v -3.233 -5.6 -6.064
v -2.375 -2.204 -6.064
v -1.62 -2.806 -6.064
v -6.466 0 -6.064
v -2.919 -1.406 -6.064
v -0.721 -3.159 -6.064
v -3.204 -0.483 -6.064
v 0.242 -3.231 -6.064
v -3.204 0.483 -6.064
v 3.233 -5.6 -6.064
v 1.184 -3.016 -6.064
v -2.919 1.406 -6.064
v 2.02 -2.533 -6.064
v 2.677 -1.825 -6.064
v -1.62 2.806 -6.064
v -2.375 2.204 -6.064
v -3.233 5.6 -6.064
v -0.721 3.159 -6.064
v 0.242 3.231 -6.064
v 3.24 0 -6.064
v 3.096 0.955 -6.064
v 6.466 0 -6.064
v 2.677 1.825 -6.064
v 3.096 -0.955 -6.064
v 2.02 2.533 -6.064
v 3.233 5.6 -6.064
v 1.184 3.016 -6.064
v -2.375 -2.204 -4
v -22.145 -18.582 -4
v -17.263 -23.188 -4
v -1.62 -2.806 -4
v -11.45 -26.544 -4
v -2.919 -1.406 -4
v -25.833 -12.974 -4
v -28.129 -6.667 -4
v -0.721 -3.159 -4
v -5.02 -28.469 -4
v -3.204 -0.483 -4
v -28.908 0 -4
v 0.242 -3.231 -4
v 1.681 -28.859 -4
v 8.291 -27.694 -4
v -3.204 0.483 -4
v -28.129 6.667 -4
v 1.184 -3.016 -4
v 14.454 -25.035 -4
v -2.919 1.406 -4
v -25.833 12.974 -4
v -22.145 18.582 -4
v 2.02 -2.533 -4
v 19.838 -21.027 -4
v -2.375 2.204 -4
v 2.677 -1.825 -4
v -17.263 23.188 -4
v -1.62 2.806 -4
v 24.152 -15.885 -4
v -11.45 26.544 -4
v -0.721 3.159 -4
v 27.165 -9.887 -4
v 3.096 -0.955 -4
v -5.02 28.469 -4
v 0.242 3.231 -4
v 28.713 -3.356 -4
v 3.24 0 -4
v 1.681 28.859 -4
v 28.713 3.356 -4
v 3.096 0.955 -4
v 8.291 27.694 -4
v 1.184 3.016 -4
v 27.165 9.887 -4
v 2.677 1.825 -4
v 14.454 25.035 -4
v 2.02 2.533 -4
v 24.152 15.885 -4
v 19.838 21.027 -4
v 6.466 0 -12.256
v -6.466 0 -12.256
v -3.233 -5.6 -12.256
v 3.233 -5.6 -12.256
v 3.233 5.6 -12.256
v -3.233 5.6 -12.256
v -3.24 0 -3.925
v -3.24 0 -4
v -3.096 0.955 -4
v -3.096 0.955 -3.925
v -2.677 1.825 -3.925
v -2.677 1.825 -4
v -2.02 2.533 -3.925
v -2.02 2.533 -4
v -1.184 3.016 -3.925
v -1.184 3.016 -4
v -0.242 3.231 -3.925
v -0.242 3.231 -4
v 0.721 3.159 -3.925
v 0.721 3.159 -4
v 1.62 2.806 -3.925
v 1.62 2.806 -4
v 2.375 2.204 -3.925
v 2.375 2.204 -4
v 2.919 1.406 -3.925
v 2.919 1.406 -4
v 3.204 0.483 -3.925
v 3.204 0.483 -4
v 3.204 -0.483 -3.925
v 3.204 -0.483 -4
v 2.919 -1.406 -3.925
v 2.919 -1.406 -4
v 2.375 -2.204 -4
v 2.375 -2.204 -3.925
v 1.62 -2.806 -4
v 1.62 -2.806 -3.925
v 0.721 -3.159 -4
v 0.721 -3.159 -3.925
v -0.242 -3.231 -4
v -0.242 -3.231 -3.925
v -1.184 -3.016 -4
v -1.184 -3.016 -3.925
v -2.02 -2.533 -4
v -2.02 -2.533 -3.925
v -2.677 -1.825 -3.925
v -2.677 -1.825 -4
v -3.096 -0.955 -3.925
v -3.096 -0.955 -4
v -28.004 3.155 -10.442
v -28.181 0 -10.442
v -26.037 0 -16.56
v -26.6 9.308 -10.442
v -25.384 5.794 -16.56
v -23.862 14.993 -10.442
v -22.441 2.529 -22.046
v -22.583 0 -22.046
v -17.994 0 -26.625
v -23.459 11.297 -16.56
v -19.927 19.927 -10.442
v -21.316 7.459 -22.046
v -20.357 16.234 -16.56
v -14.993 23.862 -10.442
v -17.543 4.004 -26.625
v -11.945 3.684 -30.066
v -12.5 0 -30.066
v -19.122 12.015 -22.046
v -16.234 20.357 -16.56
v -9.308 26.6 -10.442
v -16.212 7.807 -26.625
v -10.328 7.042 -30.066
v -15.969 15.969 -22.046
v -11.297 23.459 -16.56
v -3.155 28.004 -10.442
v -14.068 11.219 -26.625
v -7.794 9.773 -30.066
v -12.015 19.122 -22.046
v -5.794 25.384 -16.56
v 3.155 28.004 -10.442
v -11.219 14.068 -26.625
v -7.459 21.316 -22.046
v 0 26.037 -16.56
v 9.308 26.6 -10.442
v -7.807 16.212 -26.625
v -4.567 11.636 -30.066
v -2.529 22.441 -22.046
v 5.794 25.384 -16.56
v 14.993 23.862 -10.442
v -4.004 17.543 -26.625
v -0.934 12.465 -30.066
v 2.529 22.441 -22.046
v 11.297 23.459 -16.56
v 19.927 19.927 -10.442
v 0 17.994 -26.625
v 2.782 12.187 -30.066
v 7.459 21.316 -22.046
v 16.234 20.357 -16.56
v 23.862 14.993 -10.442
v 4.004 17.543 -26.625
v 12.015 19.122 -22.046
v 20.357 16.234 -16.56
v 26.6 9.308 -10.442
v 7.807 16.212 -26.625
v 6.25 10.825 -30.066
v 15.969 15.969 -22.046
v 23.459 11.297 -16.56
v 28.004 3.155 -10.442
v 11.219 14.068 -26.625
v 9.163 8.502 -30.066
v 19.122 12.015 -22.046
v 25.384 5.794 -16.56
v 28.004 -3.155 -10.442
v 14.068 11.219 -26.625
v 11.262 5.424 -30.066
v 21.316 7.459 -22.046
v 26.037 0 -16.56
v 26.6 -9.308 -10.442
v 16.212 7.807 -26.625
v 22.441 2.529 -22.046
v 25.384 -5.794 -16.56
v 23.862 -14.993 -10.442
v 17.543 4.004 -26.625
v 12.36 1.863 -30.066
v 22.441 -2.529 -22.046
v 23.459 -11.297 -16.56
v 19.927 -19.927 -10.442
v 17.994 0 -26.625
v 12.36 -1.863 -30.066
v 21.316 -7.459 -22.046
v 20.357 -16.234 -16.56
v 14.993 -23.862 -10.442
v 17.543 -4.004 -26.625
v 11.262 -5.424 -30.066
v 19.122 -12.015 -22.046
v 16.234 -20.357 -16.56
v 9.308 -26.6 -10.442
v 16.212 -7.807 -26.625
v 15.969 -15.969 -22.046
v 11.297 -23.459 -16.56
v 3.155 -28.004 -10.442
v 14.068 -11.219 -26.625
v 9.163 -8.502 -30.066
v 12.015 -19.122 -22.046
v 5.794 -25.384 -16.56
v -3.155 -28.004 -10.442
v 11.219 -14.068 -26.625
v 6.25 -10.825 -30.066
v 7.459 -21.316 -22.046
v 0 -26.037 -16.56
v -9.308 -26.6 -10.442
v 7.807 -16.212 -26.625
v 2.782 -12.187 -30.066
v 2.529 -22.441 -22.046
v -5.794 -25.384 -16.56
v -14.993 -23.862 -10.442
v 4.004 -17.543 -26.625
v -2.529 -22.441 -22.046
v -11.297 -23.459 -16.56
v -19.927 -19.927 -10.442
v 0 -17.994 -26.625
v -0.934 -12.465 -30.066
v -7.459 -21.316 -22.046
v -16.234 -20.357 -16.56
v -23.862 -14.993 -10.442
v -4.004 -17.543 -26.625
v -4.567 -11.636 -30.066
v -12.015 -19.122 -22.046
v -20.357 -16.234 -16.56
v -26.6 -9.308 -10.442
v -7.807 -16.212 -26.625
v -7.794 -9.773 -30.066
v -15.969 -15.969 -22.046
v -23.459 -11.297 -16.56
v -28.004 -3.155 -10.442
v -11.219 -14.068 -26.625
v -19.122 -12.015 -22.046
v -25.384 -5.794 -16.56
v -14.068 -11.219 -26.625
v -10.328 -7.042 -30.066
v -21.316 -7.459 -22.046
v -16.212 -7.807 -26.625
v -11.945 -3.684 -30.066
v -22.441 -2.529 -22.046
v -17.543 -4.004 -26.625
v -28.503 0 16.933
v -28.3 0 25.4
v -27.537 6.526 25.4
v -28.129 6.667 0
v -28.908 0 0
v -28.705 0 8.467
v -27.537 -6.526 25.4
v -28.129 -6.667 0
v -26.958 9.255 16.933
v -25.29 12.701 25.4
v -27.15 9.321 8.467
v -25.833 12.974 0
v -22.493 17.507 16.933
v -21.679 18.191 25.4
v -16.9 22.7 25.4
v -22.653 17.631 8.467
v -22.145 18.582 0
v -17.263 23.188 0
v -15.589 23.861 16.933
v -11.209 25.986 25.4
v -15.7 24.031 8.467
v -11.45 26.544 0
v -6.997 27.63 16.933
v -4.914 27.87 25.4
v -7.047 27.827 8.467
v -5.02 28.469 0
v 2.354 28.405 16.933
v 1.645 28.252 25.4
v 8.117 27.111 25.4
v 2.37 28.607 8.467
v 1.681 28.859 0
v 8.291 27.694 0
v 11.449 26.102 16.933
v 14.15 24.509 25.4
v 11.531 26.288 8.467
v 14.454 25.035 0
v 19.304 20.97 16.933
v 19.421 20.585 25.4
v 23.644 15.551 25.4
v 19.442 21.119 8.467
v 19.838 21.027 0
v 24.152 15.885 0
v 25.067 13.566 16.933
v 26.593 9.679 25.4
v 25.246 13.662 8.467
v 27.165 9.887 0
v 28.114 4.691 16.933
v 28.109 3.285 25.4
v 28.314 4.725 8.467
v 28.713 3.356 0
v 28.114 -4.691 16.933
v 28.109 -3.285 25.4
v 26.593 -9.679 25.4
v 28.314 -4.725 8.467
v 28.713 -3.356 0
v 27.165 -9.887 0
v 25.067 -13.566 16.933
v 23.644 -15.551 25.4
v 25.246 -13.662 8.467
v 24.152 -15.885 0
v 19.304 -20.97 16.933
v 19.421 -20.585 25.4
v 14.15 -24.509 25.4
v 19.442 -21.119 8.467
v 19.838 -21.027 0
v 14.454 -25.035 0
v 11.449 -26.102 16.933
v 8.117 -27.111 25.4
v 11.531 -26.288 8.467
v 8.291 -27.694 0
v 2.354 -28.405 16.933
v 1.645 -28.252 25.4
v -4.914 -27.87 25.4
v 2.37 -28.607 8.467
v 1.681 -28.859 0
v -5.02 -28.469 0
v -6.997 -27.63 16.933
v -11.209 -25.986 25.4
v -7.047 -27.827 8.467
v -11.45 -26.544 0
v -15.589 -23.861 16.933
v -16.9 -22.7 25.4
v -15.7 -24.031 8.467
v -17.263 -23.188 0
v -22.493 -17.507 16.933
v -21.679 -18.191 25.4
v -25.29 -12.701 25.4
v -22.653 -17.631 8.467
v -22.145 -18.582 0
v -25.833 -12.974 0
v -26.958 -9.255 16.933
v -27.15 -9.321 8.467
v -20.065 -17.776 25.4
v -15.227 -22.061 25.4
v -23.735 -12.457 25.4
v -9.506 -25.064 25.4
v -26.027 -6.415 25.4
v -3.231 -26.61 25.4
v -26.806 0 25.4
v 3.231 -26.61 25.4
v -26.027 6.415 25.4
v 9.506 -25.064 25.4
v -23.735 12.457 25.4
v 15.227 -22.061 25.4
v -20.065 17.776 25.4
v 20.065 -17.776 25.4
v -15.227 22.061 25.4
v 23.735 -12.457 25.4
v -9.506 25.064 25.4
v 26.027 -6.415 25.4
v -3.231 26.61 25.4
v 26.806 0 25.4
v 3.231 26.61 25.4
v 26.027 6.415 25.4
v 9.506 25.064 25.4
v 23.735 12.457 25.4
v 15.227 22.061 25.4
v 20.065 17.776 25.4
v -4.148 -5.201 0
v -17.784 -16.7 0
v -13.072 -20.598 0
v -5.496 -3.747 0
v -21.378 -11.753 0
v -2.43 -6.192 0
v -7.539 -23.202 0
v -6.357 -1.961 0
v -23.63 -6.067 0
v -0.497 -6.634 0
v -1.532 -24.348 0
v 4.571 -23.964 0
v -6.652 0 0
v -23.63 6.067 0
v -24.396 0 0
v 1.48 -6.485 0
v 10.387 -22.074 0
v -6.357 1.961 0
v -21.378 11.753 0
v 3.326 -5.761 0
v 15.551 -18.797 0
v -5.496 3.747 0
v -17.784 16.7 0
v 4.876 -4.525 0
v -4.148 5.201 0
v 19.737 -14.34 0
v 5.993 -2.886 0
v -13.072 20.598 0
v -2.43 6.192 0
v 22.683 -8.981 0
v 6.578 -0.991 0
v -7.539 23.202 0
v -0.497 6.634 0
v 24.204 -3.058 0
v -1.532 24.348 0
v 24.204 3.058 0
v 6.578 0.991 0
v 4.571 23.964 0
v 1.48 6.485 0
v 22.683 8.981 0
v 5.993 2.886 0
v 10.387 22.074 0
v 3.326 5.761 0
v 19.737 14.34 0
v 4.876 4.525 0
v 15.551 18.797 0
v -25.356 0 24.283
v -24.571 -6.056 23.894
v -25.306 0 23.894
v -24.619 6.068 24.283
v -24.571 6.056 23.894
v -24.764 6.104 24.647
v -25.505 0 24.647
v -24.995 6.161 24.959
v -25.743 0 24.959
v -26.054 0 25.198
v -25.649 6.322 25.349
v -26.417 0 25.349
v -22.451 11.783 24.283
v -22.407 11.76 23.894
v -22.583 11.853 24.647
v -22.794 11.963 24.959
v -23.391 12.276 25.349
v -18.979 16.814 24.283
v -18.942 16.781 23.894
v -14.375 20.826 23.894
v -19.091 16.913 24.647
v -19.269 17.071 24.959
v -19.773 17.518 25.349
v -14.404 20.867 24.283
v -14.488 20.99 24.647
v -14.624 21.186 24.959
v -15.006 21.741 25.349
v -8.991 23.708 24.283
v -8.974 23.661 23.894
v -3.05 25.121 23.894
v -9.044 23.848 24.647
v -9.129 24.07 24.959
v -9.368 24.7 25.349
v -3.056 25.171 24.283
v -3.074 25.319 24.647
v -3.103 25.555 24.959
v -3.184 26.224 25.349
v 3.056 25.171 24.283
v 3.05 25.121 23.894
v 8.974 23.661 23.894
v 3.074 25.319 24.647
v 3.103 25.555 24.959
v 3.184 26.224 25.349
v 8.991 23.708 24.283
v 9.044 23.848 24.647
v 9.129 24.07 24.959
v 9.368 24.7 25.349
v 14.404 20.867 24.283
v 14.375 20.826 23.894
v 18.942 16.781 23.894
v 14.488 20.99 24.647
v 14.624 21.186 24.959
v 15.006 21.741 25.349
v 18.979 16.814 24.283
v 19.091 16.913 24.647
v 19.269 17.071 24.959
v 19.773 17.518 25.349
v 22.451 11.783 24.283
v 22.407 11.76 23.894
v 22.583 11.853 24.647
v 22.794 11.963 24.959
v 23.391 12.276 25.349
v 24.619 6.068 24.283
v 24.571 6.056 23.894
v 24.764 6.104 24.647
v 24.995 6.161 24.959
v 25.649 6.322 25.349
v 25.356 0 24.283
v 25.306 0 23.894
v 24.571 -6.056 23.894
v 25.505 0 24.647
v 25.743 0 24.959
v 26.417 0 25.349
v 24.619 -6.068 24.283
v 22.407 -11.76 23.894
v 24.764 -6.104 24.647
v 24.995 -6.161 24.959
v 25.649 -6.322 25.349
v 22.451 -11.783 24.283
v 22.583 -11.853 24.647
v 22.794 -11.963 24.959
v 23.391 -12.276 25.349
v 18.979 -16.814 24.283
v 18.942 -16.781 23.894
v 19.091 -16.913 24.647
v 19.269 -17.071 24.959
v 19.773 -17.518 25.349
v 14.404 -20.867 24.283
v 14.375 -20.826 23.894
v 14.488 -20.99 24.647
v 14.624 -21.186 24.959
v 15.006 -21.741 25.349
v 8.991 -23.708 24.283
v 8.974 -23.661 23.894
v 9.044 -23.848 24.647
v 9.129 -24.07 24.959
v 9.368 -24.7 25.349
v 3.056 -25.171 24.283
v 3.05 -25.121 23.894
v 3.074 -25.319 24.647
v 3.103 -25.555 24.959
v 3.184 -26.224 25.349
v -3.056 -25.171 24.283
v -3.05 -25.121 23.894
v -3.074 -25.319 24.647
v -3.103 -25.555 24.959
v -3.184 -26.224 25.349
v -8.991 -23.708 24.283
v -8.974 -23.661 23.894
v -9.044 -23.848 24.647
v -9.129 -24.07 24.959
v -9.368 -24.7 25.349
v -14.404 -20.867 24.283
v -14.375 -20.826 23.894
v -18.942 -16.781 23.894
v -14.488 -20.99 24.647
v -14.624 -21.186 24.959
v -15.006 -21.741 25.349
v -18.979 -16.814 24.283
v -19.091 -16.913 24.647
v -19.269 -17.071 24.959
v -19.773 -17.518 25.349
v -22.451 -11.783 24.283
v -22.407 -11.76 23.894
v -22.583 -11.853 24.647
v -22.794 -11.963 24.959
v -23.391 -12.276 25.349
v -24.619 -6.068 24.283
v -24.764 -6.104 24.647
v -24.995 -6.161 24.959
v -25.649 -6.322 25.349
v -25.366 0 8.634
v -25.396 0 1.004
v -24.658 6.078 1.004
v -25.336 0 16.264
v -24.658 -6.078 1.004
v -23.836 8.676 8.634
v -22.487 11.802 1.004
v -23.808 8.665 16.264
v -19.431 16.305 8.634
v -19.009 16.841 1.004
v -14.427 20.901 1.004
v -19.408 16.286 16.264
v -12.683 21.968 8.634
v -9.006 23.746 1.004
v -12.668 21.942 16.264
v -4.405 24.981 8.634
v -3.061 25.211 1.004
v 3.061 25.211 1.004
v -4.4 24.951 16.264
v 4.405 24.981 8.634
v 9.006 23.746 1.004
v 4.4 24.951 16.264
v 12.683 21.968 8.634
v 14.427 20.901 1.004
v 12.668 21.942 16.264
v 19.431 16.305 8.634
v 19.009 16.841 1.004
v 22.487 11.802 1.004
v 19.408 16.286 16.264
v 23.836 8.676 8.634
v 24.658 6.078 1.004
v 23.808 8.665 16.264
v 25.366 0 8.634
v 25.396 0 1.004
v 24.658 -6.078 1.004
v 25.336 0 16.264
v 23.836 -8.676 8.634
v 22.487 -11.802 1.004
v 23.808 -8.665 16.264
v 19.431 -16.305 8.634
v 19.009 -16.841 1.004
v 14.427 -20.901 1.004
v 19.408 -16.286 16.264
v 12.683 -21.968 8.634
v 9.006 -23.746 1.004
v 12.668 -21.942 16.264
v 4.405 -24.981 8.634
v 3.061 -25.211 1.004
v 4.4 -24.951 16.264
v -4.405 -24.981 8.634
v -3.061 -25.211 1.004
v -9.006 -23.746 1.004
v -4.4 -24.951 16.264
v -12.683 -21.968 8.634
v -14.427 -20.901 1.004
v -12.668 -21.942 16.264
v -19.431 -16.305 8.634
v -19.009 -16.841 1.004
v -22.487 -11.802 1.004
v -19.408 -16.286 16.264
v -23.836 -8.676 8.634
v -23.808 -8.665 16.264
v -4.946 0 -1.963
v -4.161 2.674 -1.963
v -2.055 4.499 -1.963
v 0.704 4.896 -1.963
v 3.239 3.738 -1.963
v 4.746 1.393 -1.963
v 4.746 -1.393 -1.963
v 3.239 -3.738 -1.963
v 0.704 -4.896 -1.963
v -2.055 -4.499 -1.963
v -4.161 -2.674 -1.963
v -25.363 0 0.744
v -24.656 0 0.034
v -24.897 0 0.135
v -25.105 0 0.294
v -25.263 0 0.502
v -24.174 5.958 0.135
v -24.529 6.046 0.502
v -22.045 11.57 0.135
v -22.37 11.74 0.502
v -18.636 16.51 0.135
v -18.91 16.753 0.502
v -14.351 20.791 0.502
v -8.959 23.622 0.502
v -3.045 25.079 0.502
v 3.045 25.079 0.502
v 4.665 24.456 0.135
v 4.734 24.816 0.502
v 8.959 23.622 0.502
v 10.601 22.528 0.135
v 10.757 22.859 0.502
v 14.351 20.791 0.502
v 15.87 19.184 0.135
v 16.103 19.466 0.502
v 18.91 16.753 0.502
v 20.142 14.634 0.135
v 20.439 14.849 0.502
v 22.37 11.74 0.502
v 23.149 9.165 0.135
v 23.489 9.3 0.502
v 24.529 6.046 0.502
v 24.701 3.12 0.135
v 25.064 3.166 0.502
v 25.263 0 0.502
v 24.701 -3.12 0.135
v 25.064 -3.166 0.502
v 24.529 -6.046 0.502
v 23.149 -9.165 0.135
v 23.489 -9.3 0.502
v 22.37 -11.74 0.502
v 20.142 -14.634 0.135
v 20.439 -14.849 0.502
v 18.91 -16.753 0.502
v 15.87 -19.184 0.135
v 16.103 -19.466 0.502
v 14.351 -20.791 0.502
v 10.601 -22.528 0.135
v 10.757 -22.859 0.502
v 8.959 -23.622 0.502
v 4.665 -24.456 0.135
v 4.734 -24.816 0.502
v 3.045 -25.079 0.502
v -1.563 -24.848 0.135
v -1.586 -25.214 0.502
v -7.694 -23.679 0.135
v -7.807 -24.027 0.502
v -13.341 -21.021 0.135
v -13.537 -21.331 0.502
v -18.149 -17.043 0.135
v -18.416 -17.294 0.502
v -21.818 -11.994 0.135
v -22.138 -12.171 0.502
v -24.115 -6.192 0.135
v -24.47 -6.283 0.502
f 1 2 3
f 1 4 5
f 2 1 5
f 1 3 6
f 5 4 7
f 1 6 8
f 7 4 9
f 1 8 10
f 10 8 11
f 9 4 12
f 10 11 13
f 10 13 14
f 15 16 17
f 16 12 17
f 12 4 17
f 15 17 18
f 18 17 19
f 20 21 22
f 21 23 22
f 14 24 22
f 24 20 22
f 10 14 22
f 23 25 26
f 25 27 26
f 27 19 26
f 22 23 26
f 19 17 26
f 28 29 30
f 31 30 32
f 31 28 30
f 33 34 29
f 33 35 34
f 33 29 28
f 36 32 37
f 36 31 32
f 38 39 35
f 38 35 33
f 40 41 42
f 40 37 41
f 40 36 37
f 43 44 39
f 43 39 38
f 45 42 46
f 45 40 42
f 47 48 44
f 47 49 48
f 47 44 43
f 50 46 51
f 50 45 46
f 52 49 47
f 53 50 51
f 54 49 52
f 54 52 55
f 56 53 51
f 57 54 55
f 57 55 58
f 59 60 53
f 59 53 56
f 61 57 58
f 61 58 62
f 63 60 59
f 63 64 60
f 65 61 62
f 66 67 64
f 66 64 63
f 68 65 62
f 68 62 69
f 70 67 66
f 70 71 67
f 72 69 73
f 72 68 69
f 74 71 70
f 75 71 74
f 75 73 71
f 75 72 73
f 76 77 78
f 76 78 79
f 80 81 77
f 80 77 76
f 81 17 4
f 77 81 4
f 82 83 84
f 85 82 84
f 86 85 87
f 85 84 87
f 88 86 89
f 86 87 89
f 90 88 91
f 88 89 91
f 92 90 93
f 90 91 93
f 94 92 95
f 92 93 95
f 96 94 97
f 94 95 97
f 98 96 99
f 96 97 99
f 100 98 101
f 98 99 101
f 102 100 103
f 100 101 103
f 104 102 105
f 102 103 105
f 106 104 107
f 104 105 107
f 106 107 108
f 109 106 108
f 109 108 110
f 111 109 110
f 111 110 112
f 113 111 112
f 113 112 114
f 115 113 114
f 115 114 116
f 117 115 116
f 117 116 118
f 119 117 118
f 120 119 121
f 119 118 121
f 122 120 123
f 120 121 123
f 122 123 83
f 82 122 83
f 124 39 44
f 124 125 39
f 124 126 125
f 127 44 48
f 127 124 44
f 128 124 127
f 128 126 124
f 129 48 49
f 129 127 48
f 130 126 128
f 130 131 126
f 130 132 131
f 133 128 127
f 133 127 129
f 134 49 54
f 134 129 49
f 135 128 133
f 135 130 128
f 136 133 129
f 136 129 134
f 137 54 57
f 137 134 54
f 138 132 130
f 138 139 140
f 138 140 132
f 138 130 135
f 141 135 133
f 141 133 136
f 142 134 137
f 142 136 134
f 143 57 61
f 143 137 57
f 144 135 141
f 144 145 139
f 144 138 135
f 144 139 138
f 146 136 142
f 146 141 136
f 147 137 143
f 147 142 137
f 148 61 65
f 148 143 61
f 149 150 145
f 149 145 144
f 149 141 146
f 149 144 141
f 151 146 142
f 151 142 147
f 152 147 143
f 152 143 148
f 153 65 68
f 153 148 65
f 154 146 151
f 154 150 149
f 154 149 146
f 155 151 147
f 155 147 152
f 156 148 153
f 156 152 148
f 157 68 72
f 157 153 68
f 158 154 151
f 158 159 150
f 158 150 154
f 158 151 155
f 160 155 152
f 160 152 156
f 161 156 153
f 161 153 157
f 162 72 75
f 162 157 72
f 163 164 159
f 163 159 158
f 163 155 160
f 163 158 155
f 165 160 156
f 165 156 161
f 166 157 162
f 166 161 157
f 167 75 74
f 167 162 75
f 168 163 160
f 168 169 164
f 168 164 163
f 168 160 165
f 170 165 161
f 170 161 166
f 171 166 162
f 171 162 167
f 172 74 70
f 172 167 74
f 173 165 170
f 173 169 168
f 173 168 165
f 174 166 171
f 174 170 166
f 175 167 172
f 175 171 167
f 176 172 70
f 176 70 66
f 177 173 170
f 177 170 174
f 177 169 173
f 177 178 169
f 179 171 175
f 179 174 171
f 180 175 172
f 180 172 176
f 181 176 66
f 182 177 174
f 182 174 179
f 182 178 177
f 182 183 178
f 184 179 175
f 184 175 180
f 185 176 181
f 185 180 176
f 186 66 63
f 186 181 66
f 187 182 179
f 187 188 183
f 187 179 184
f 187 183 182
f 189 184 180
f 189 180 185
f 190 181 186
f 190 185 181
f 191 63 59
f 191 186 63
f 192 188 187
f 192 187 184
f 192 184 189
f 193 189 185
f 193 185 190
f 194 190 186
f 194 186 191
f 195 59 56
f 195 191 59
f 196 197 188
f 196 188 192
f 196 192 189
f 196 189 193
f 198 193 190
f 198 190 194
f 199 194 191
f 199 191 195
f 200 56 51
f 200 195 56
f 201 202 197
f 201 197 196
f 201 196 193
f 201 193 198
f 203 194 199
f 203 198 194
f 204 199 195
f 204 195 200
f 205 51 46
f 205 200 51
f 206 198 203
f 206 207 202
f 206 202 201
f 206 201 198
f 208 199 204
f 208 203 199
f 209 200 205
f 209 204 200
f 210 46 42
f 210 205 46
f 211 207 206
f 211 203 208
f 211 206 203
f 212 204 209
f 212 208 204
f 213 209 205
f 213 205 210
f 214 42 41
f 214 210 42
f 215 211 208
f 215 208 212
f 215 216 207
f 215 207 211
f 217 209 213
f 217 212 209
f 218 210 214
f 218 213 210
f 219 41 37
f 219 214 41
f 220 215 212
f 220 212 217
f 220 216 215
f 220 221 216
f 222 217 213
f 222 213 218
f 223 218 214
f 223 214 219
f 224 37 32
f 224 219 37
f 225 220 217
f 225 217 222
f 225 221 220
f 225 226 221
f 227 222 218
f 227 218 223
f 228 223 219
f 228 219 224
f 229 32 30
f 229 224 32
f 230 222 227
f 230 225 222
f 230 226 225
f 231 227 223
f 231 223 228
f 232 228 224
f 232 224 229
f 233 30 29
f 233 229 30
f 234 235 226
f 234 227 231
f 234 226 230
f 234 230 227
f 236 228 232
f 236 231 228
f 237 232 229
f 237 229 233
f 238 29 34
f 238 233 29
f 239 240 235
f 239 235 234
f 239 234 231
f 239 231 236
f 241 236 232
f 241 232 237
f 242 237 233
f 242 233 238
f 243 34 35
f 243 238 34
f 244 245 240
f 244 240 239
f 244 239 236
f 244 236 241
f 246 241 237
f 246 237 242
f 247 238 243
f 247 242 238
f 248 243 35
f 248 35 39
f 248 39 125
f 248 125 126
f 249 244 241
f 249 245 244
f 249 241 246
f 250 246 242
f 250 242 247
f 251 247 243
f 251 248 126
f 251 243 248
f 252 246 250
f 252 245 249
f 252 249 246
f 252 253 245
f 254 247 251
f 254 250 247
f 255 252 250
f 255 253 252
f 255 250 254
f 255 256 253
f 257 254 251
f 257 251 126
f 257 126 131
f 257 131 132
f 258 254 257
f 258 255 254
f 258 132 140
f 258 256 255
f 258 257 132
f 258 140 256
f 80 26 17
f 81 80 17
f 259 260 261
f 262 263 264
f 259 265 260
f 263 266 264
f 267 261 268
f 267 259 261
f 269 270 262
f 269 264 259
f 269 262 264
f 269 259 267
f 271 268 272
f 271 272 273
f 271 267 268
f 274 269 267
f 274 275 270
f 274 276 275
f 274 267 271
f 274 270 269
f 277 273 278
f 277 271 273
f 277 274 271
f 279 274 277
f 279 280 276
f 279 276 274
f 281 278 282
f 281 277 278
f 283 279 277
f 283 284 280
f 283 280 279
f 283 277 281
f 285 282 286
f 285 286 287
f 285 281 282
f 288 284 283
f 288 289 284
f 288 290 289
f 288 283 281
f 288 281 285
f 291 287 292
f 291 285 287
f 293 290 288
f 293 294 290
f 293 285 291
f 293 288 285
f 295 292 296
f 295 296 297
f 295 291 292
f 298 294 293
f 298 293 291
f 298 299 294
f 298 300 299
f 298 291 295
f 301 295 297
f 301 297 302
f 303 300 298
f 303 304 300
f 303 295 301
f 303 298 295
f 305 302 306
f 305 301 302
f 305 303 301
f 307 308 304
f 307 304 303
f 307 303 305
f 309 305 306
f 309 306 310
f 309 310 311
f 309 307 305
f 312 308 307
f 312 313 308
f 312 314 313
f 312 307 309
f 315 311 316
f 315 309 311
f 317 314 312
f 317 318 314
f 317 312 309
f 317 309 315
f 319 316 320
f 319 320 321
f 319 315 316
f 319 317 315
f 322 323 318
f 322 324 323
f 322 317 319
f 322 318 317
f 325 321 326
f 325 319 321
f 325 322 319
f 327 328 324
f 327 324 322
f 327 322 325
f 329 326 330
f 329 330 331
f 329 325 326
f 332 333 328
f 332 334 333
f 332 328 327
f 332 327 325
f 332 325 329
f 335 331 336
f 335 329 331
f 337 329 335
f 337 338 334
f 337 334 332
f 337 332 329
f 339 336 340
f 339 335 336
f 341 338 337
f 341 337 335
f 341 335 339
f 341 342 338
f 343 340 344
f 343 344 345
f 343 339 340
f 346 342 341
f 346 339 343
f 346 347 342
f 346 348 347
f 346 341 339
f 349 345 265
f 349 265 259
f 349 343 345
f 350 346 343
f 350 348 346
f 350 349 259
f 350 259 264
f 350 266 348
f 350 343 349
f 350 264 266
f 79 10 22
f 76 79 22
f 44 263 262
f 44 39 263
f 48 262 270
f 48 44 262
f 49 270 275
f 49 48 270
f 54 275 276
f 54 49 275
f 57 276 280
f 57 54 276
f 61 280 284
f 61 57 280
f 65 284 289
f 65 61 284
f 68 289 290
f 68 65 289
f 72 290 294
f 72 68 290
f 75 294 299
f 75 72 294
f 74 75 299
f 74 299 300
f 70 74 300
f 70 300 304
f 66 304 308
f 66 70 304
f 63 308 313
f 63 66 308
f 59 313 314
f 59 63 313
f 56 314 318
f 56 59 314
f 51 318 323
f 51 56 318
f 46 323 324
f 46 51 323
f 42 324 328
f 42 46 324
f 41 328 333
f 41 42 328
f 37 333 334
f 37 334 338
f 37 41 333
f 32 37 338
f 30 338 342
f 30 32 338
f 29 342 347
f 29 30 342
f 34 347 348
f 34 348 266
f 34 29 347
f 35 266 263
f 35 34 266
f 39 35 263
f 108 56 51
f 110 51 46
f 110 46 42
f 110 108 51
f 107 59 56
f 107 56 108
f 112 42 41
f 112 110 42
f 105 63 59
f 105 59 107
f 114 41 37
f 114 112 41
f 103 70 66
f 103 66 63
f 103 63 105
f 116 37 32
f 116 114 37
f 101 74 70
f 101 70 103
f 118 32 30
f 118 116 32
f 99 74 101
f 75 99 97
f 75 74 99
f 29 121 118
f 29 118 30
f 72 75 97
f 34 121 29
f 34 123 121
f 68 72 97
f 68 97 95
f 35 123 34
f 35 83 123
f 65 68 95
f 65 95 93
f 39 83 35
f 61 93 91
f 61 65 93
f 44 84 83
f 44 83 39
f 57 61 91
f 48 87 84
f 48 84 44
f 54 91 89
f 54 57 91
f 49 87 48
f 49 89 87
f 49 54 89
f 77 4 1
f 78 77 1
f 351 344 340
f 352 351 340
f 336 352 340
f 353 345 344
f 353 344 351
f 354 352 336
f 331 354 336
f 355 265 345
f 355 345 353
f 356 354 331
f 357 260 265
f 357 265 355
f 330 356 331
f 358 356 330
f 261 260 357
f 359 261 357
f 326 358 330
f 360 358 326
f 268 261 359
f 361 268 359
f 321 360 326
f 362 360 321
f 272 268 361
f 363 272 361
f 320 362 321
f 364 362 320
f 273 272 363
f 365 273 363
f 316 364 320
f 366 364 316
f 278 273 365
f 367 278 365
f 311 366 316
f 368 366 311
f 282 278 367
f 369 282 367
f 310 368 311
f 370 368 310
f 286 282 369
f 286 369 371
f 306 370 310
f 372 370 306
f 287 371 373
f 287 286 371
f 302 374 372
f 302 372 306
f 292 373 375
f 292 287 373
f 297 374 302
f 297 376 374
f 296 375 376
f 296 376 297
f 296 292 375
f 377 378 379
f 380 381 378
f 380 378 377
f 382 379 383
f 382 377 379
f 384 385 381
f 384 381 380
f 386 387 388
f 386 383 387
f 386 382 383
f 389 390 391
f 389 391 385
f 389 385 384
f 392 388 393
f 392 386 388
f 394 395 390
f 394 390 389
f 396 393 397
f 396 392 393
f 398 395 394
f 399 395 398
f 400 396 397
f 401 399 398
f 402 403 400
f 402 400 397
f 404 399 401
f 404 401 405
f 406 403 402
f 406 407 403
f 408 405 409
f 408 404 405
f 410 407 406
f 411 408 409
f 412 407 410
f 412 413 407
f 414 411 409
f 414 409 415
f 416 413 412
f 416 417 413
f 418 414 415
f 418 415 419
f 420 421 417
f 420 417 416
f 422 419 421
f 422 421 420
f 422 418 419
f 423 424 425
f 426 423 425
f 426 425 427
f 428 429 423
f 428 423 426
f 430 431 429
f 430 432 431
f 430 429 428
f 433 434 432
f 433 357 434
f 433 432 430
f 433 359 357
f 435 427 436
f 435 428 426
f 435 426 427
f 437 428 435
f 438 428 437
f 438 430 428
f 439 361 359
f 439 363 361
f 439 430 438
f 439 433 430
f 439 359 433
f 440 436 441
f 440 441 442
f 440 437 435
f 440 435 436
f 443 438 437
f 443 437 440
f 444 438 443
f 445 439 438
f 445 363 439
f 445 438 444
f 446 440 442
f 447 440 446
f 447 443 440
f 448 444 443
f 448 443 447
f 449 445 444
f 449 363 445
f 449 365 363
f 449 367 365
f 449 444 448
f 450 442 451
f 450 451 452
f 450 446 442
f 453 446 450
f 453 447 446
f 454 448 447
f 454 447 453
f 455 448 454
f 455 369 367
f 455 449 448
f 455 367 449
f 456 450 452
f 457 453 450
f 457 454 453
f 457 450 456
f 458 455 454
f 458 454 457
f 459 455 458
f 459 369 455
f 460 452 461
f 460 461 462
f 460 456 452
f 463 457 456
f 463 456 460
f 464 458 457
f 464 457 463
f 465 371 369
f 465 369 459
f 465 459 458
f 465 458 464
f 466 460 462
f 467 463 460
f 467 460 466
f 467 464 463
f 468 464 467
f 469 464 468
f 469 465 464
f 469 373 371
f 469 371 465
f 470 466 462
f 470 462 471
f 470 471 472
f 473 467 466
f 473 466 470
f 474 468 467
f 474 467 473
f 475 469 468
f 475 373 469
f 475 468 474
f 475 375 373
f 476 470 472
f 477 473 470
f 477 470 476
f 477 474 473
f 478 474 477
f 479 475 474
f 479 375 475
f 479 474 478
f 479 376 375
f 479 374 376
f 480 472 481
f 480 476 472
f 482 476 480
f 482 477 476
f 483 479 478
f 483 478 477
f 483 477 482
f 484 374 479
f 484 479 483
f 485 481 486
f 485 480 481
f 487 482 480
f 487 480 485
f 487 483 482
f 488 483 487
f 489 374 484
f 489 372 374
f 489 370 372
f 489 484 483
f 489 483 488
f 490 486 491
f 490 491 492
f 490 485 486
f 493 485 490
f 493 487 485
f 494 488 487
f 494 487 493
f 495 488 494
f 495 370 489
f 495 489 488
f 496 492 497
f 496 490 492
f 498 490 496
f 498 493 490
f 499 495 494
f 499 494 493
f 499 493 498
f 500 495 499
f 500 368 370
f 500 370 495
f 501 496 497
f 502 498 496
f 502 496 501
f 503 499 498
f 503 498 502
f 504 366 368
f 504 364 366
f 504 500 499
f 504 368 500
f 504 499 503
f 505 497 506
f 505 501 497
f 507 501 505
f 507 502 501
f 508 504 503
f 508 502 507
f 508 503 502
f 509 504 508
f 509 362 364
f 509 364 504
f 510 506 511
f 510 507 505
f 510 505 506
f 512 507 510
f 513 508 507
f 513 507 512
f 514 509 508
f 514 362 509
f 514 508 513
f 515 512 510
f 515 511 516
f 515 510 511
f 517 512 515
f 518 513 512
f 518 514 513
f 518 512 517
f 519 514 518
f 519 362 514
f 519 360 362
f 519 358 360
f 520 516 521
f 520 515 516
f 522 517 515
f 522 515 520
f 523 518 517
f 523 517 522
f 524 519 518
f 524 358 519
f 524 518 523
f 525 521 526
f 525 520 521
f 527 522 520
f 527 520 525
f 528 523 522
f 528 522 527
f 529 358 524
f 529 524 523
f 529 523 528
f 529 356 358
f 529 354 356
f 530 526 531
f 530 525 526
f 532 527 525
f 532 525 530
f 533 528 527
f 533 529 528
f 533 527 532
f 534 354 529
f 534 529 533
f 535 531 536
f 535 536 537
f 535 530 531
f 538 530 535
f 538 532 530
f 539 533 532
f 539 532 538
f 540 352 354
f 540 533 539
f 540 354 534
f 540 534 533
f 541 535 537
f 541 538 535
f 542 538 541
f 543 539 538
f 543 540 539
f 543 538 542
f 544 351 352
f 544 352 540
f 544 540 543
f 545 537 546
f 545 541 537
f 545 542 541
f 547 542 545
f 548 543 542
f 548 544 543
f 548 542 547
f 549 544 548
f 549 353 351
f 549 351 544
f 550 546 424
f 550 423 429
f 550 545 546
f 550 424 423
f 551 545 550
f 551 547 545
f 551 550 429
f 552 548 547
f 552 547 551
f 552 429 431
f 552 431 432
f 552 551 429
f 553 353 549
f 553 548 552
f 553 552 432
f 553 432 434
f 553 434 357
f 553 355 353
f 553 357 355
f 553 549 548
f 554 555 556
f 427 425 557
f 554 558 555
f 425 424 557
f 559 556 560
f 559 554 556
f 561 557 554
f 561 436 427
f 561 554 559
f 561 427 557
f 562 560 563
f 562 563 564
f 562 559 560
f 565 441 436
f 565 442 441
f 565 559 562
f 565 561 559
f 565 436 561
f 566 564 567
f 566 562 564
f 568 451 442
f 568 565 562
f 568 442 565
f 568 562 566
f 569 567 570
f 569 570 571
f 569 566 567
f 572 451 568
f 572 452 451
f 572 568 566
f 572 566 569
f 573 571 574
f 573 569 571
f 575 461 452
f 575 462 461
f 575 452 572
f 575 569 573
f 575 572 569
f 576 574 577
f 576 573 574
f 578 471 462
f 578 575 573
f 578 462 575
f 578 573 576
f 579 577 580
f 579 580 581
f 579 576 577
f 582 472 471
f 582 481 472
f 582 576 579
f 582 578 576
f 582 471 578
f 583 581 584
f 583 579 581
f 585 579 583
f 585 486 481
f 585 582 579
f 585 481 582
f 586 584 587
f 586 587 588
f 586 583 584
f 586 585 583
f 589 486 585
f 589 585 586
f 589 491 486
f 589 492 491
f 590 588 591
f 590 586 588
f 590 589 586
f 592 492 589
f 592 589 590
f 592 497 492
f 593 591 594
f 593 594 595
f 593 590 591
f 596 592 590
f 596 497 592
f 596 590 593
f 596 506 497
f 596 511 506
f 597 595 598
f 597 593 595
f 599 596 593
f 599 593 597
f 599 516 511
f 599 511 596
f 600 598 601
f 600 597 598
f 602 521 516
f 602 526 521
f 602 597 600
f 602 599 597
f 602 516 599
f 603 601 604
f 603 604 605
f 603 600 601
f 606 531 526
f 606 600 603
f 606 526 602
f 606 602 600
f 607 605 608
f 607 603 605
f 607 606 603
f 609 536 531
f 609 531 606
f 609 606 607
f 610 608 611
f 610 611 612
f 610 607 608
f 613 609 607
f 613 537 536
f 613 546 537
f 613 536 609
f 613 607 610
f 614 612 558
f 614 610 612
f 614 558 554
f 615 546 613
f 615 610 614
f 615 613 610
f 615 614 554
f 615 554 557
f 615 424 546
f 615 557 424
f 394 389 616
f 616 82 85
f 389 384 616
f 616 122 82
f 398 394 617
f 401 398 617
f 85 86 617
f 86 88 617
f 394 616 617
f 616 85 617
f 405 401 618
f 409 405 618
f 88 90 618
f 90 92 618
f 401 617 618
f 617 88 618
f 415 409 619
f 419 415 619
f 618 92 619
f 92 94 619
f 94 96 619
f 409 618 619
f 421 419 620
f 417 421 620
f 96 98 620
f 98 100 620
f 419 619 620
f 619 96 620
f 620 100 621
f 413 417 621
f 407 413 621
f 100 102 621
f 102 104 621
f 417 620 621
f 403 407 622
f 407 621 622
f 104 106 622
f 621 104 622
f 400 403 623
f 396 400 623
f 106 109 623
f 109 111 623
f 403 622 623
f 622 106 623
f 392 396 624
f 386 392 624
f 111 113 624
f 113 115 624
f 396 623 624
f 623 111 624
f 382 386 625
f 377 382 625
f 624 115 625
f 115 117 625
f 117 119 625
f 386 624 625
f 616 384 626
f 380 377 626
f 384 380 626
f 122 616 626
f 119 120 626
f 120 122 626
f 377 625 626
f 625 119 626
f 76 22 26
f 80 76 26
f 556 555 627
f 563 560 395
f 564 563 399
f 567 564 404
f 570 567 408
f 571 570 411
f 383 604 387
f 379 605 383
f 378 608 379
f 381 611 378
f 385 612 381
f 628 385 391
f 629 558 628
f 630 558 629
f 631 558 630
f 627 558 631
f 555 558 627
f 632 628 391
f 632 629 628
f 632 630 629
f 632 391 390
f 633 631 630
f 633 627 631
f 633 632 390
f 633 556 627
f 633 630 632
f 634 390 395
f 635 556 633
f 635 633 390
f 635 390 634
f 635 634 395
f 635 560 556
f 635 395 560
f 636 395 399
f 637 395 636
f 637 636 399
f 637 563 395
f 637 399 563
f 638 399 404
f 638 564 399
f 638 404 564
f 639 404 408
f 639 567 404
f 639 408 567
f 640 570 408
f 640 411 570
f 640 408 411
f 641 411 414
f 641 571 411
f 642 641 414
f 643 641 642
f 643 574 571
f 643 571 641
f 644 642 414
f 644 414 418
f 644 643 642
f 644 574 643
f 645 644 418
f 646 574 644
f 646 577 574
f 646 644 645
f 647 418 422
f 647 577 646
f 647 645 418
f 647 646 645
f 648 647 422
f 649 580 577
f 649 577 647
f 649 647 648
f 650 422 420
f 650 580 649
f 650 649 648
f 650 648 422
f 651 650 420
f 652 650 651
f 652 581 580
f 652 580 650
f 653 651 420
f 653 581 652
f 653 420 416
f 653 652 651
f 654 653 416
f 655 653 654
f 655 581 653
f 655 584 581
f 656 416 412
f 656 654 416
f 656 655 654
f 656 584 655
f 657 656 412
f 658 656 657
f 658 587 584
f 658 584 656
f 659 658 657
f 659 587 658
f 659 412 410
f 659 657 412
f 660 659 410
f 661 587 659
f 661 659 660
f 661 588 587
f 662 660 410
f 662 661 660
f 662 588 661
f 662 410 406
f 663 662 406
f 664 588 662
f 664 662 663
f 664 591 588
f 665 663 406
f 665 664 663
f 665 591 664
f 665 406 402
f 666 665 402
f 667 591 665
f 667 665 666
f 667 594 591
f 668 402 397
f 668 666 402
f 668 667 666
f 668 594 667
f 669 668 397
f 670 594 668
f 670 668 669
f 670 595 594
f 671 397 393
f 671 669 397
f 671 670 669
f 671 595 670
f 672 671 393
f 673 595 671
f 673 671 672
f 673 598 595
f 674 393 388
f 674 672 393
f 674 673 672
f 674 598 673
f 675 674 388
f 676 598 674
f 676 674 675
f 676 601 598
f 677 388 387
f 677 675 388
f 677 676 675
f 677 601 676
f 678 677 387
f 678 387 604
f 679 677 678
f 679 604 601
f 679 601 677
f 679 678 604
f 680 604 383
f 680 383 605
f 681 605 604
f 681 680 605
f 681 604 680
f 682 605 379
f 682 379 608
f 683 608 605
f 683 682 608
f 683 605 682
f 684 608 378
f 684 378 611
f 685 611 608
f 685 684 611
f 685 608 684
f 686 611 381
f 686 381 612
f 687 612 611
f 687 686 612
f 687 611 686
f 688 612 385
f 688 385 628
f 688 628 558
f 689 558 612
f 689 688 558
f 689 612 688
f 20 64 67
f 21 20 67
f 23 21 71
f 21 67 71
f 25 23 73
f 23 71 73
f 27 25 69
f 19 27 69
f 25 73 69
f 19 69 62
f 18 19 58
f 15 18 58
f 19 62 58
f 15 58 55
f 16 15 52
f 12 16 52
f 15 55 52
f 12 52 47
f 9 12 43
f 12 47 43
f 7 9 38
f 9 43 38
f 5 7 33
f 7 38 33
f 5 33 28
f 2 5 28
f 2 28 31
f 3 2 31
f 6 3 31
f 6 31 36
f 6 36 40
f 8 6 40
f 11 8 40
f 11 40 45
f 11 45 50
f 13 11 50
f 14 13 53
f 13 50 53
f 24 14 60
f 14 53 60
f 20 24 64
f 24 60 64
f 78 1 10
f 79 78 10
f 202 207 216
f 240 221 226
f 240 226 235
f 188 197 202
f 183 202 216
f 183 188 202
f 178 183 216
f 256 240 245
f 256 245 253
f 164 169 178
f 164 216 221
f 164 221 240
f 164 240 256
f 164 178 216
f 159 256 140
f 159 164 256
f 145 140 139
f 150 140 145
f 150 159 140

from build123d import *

# Parameters (mm, degrees)
F2_R      = 1
F3_R      = 1.5
F5_W      = 6.6521469513
F5_H      = 11.3077862186
F10_DEPTH = 6.192
F13_R     = 3.24
F14_DEPTH = 2.064


with BuildPart() as f1:
    # F0 (on Front) → F1 (revolve)
    with BuildSketch(Plane.XZ):
        Polygon((0, -4), (0, 0), (-25.4, 0), (-25.3, 25.4), (-28.3, 25.4), (-28.908, 0), (-28.908, -4), align=None)
    revolve(axis=Axis((0, 0, -2), (0, 0, -1)))

    # F2
    f2_edges = [f1.edges().sort_by_distance(p)[0] for p in [
        (25.4, 0, 0),
    ]]
    fillet(f2_edges, radius=F2_R)

    # F3
    f3_edges = [f1.edges().sort_by_distance(p)[0] for p in [
        (25.3, 0, 25.4),
    ]]
    fillet(f3_edges, radius=F3_R)

    # F5 (on Front) → F6 (revolve, cut)
    with BuildSketch(Plane.XZ):
        with Locations((-3.3260734756, 5.6538931093)):
            Rectangle(F5_W, F5_H)
        Polygon((0, -15.6807032946), (0, 0), (-6.6521469513, 0), (-3.24, -3.9252260535), (-3.24, -15.6807032946), (-3.175, -15.6807032946), align=None)
    revolve(axis=Axis((0, 0, -2.186458538), (0, 0, -1)), mode=Mode.SUBTRACT)


with BuildPart() as f8:
    # F7 (on Front) → F8 (revolve)
    with BuildSketch(Plane.XZ):
        with BuildLine():
            Line((0, -4), (-28.908, -4))
            ThreePointArc((-28.908, -4), (-24.4644892038, -19.40004), (-12.5, -30.0657335212))
            Line((-12.5, -30.0657335212), (0, -30.0657335212))
            Line((0, -30.0657335212), (0, -4))
        make_face()
    revolve(axis=Axis((0, 0, -17.0328667606), (0, 0, -1)))


with BuildPart() as f10:
    # F9 (on face) → F10 (new body)
    with BuildSketch(Plane.XY.offset(-4)):
        Polygon((3.2331615075, 5.6), (-3.2331615075, 5.6), (-6.4663230149, 0), (-3.2331615075, -5.6), (3.2331615075, -5.6), (6.4663230149, 0), align=None)
    extrude(amount=-F10_DEPTH)


with BuildPart() as f10_1:
    # F11: moved
    add(f10.part.moved(Location((0, 0, -2.064))))


with BuildPart() as f8_1:
    add(f8.part)

    # F12: cut F10
    add(f10_1.part, mode=Mode.SUBTRACT)

    # F13 (on face) → F14 (cut)
    with BuildSketch(Plane.XY.offset(-4)):
        Circle(F13_R)
    extrude(amount=-F14_DEPTH, mode=Mode.SUBTRACT)


solid = Compound([f1.part, f8_1.part])
